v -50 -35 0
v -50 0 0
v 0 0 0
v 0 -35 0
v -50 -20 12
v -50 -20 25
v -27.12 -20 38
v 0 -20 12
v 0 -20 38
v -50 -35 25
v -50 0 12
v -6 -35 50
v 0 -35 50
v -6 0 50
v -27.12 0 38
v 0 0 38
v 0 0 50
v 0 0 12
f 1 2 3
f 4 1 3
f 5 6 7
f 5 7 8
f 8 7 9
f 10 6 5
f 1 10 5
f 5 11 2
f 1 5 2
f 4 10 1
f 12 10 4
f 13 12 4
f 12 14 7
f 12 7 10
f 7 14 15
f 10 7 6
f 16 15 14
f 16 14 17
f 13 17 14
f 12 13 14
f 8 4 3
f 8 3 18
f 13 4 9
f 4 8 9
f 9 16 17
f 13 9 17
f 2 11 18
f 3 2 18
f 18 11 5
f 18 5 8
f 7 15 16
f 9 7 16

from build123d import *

# Parameters (mm, degrees)
F1_DEPTH = 35
F2_W     = 50
F2_H     = 26
F3_DEPTH = 20


with BuildPart() as f1:
    # F0 (on Front) → F1 (new body)
    with BuildSketch(Plane.XZ):
        Polygon((-50, 0), (0, 0), (0, 50), (-6, 50), (-50, 25), align=None)
    extrude(amount=F1_DEPTH)

    # F2 (on Front) → F3 (cut)
    with BuildSketch(Plane.XZ):
        with Locations((-25, 25)):
            Rectangle(F2_W, F2_H)
    extrude(amount=F3_DEPTH, mode=Mode.SUBTRACT)


solid = f1.part
